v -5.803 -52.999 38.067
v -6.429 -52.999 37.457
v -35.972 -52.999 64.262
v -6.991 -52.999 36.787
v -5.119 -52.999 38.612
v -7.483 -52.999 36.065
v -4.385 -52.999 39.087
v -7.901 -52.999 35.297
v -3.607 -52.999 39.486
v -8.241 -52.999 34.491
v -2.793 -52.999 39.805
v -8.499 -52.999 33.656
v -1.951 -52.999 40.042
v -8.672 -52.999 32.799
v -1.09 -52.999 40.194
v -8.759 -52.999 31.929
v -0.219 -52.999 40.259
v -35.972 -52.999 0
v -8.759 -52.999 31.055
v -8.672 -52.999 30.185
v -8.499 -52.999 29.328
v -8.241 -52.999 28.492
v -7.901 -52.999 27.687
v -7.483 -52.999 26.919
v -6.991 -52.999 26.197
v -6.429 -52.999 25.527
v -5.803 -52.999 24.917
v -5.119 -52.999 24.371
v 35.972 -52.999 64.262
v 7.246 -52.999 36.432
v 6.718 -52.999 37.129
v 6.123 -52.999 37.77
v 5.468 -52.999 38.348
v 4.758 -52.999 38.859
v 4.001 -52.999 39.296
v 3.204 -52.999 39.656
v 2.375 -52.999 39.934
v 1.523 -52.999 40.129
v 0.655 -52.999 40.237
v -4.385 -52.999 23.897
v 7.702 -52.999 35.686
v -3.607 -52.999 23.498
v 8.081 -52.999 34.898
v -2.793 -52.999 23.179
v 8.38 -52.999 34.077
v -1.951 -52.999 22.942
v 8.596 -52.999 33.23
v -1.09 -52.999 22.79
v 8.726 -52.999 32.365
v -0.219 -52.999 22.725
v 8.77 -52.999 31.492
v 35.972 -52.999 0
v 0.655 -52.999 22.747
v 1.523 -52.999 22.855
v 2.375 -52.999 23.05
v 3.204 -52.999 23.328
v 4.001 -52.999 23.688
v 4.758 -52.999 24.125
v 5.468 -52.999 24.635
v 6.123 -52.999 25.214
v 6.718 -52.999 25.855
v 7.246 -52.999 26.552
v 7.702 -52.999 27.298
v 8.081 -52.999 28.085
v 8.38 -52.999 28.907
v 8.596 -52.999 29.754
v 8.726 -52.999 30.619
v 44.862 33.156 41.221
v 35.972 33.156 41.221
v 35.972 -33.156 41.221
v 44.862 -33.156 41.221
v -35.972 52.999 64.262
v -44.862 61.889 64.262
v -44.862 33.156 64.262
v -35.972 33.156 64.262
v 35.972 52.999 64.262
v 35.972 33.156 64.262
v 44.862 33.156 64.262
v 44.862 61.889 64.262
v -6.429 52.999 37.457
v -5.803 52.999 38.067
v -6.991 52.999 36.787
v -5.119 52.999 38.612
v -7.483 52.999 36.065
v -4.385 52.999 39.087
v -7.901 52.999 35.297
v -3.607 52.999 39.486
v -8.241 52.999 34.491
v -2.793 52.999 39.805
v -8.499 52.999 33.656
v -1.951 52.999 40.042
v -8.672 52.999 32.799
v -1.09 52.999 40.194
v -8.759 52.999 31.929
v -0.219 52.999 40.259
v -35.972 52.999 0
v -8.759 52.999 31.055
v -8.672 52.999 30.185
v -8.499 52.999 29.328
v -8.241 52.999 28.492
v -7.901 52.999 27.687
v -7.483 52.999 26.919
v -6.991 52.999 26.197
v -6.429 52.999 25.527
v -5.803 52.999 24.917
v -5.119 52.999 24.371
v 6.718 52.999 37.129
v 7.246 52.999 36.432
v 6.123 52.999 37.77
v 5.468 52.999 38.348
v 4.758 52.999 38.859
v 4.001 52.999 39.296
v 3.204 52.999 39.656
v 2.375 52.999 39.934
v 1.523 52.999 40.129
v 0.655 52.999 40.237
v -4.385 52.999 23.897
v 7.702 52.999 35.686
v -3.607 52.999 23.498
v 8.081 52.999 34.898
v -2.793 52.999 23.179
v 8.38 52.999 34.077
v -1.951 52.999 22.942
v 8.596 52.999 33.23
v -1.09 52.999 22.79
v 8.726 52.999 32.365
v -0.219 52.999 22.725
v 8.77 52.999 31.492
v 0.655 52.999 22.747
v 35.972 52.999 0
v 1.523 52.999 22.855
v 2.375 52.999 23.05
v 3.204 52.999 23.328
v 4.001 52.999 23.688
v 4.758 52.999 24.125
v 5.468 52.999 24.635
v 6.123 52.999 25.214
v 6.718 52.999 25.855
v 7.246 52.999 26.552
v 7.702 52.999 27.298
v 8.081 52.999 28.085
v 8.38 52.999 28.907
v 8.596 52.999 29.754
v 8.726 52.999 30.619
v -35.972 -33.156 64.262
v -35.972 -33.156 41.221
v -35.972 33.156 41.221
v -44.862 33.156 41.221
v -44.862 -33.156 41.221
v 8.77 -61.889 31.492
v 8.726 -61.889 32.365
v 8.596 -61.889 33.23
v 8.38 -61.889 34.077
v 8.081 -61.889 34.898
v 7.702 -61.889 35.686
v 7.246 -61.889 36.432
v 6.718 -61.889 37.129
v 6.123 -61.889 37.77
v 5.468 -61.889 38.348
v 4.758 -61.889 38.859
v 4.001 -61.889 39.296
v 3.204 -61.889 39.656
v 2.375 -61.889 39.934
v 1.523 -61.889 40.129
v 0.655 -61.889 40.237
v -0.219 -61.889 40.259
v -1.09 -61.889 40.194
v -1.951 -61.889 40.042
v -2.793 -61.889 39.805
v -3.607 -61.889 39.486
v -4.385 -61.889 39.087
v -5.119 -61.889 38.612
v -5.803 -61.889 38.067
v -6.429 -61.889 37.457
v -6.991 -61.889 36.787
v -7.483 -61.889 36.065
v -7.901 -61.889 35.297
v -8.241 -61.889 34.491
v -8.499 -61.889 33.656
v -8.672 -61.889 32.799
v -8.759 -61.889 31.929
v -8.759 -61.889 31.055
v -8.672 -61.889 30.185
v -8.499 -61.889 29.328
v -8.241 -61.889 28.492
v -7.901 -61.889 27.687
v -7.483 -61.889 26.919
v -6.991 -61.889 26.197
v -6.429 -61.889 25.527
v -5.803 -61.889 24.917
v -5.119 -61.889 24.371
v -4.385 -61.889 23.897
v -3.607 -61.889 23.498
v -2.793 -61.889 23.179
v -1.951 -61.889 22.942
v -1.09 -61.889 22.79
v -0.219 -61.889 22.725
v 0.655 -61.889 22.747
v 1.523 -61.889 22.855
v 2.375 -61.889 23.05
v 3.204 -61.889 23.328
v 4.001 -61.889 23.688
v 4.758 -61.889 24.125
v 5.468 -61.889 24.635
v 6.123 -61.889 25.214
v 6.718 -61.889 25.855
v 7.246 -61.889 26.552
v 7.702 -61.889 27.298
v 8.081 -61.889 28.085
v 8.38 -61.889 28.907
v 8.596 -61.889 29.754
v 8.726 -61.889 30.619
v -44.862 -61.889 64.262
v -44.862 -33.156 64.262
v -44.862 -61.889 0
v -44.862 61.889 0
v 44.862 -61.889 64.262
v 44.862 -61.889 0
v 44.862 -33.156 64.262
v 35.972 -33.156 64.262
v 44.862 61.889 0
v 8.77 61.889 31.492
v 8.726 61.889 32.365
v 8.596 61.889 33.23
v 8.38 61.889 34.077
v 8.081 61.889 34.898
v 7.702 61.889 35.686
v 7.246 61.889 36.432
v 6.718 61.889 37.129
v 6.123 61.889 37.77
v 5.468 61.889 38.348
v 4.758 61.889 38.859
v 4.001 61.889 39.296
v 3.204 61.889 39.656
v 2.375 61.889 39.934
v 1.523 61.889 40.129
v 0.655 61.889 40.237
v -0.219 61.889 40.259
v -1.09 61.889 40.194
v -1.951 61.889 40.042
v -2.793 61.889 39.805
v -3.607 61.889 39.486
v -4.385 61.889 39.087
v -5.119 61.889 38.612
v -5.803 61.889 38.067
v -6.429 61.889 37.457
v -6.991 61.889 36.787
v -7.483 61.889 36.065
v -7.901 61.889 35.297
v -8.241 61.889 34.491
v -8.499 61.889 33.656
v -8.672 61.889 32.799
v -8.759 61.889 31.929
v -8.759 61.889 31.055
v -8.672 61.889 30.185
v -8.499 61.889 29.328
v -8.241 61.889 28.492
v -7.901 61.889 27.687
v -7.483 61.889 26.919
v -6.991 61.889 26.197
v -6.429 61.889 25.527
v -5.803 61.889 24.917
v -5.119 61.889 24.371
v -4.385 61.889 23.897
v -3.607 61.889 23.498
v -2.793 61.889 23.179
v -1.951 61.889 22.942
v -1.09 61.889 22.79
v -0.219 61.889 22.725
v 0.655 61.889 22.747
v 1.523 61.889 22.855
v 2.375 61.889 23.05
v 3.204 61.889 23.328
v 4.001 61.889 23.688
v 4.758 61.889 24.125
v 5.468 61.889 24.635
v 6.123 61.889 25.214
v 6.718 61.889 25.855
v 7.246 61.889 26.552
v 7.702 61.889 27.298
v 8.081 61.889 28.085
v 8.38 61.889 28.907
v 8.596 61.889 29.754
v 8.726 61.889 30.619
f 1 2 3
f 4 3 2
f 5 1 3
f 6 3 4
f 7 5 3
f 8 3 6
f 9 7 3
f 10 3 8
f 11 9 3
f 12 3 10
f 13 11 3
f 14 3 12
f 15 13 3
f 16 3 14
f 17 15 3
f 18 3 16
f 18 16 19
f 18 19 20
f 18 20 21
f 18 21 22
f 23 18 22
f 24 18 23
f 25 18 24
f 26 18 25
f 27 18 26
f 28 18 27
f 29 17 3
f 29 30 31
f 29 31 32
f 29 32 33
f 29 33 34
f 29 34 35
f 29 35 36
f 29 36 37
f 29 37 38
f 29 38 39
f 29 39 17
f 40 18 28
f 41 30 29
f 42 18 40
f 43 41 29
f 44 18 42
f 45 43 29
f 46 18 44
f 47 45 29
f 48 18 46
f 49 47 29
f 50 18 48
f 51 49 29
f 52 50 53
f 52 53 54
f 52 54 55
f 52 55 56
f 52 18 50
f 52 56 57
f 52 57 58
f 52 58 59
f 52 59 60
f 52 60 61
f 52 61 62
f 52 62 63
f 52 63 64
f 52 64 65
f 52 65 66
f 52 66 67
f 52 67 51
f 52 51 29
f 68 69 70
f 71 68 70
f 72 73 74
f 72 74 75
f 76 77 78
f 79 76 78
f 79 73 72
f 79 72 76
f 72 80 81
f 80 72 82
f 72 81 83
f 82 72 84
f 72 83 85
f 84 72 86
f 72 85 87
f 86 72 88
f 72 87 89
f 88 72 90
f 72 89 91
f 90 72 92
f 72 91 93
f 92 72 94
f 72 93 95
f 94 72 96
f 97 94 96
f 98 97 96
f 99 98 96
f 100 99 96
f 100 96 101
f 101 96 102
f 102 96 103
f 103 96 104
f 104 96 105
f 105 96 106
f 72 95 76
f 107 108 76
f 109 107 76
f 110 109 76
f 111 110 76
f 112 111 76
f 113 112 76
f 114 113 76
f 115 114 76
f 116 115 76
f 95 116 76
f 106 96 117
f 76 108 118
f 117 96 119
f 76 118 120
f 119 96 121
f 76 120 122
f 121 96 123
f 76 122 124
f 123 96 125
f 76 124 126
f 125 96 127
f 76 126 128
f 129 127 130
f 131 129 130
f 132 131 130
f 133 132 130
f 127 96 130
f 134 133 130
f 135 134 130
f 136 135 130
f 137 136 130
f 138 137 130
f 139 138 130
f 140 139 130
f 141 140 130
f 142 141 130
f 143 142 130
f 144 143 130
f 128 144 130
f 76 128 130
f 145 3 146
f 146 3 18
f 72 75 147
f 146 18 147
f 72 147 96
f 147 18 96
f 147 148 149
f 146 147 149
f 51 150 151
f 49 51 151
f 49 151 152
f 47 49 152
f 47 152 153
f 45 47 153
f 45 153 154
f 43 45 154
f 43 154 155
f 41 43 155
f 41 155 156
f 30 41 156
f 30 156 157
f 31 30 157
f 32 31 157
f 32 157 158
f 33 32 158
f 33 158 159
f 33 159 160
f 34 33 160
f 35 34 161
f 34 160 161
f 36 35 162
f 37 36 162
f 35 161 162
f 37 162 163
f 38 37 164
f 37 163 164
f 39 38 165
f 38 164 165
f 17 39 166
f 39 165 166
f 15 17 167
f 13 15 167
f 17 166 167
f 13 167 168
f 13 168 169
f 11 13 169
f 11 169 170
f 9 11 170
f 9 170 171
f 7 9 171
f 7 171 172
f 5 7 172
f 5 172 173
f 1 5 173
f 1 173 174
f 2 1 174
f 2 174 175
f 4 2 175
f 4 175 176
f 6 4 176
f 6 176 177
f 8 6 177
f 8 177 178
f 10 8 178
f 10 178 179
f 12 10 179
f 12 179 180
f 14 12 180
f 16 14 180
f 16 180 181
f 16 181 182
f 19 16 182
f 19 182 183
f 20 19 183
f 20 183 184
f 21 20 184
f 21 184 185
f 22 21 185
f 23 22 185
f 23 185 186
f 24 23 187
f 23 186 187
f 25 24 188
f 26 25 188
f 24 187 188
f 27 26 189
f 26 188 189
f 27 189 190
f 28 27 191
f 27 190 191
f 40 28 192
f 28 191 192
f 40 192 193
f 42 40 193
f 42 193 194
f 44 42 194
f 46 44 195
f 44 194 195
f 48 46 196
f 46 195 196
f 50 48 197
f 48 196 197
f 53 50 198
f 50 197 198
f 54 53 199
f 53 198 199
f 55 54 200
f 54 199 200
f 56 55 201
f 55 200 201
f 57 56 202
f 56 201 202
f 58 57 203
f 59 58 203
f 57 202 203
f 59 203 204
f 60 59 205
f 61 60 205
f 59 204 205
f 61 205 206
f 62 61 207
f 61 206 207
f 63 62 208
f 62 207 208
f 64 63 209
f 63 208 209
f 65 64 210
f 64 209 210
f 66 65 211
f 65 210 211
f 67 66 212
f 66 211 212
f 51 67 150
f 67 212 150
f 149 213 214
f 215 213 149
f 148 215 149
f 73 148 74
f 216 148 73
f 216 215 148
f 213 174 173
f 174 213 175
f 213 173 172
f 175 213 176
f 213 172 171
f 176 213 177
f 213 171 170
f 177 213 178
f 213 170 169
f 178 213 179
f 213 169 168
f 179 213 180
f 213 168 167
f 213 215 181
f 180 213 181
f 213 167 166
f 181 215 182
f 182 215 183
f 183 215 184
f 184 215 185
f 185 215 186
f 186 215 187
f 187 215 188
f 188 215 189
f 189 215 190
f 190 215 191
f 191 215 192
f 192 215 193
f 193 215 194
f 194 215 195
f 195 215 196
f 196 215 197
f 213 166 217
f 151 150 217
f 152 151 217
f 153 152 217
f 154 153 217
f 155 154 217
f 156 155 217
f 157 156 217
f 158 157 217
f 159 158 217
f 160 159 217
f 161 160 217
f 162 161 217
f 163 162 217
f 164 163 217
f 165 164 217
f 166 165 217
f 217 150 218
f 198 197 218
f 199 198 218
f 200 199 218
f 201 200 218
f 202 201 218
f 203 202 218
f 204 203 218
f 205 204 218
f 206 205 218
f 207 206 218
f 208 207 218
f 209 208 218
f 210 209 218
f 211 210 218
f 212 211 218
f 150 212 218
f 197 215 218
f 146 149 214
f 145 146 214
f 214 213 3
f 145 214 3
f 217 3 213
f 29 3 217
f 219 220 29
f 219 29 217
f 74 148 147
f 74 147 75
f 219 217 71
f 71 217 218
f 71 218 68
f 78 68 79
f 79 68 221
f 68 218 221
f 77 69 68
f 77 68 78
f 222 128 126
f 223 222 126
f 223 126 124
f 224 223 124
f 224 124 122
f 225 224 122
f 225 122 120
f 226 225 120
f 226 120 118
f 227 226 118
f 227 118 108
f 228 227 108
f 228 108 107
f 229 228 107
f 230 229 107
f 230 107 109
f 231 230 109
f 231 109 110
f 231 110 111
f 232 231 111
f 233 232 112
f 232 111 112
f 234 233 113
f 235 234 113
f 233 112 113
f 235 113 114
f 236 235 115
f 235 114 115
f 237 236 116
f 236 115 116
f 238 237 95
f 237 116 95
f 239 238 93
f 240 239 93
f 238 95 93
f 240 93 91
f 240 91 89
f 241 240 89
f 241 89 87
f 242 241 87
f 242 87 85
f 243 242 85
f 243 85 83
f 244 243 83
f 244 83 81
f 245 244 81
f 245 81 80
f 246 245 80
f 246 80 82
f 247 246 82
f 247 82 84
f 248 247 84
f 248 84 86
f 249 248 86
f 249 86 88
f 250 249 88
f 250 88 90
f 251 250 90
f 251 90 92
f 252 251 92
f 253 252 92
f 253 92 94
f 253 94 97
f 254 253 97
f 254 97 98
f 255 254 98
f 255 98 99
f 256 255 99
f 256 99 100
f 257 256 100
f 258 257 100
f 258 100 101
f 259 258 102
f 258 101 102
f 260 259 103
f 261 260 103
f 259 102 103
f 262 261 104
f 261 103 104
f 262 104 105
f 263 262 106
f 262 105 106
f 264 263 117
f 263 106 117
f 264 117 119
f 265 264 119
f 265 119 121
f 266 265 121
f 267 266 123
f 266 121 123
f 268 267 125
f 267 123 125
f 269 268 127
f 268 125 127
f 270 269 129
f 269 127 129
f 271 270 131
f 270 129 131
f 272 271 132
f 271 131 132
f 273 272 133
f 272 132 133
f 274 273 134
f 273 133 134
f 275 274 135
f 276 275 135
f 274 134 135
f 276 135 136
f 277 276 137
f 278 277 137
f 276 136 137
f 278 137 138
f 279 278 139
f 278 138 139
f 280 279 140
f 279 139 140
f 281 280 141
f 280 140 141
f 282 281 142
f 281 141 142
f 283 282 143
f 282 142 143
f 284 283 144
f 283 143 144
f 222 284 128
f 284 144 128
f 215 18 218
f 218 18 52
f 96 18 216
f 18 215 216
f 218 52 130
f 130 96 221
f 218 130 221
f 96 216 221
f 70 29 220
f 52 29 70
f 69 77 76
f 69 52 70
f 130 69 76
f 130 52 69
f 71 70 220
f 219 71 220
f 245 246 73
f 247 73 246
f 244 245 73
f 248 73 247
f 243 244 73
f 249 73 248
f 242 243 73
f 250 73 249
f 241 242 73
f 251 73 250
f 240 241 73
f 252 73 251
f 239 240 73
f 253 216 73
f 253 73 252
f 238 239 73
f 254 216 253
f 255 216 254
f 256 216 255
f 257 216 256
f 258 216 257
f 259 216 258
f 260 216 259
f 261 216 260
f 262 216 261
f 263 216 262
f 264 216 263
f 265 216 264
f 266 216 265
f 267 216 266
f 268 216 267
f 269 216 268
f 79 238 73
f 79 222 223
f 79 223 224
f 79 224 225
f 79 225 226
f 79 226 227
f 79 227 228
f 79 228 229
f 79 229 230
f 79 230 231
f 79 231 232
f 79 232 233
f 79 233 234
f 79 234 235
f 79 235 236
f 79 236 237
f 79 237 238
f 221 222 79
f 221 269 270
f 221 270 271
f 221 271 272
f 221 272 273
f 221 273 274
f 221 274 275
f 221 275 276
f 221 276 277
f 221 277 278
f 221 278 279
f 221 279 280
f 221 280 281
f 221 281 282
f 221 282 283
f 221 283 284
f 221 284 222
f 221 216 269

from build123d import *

# Parameters (mm, degrees)
F0_W     = 89.724988
F0_H     = 123.777248
F0_W_2   = 71.94499
F0_H_2   = 105.99725
F1_DEPTH = 64.262
F2_R     = 8.769798
F3_DEPTH = 149.86
F4_W     = 66.31229
F4_H     = 46.081694
F5_DEPTH = 136.906


with BuildPart() as f1:
    # F0 (on Top) → F1 (new body)
    with BuildSketch(Plane.XY):
        Rectangle(F0_W, F0_H)
        Rectangle(F0_W_2, F0_H_2, mode=Mode.SUBTRACT)
    extrude(amount=F1_DEPTH)

    # F2 (on face) → F3 (cut)
    with BuildSketch(Plane.XZ.offset(61.888624)):
        with Locations((0, 31.491935)):
            Circle(F2_R)
    extrude(amount=-F3_DEPTH, mode=Mode.SUBTRACT)

    # F4 (on face) → F5 (cut)
    with BuildSketch(Plane(origin=(-44.862494, 0, 0), x_dir=(0, -1, 0), z_dir=(-1, 0, 0))):
        with Locations((0, 64.262)):
            Rectangle(F4_W, F4_H)
    extrude(amount=-F5_DEPTH, mode=Mode.SUBTRACT)


solid = f1.part
